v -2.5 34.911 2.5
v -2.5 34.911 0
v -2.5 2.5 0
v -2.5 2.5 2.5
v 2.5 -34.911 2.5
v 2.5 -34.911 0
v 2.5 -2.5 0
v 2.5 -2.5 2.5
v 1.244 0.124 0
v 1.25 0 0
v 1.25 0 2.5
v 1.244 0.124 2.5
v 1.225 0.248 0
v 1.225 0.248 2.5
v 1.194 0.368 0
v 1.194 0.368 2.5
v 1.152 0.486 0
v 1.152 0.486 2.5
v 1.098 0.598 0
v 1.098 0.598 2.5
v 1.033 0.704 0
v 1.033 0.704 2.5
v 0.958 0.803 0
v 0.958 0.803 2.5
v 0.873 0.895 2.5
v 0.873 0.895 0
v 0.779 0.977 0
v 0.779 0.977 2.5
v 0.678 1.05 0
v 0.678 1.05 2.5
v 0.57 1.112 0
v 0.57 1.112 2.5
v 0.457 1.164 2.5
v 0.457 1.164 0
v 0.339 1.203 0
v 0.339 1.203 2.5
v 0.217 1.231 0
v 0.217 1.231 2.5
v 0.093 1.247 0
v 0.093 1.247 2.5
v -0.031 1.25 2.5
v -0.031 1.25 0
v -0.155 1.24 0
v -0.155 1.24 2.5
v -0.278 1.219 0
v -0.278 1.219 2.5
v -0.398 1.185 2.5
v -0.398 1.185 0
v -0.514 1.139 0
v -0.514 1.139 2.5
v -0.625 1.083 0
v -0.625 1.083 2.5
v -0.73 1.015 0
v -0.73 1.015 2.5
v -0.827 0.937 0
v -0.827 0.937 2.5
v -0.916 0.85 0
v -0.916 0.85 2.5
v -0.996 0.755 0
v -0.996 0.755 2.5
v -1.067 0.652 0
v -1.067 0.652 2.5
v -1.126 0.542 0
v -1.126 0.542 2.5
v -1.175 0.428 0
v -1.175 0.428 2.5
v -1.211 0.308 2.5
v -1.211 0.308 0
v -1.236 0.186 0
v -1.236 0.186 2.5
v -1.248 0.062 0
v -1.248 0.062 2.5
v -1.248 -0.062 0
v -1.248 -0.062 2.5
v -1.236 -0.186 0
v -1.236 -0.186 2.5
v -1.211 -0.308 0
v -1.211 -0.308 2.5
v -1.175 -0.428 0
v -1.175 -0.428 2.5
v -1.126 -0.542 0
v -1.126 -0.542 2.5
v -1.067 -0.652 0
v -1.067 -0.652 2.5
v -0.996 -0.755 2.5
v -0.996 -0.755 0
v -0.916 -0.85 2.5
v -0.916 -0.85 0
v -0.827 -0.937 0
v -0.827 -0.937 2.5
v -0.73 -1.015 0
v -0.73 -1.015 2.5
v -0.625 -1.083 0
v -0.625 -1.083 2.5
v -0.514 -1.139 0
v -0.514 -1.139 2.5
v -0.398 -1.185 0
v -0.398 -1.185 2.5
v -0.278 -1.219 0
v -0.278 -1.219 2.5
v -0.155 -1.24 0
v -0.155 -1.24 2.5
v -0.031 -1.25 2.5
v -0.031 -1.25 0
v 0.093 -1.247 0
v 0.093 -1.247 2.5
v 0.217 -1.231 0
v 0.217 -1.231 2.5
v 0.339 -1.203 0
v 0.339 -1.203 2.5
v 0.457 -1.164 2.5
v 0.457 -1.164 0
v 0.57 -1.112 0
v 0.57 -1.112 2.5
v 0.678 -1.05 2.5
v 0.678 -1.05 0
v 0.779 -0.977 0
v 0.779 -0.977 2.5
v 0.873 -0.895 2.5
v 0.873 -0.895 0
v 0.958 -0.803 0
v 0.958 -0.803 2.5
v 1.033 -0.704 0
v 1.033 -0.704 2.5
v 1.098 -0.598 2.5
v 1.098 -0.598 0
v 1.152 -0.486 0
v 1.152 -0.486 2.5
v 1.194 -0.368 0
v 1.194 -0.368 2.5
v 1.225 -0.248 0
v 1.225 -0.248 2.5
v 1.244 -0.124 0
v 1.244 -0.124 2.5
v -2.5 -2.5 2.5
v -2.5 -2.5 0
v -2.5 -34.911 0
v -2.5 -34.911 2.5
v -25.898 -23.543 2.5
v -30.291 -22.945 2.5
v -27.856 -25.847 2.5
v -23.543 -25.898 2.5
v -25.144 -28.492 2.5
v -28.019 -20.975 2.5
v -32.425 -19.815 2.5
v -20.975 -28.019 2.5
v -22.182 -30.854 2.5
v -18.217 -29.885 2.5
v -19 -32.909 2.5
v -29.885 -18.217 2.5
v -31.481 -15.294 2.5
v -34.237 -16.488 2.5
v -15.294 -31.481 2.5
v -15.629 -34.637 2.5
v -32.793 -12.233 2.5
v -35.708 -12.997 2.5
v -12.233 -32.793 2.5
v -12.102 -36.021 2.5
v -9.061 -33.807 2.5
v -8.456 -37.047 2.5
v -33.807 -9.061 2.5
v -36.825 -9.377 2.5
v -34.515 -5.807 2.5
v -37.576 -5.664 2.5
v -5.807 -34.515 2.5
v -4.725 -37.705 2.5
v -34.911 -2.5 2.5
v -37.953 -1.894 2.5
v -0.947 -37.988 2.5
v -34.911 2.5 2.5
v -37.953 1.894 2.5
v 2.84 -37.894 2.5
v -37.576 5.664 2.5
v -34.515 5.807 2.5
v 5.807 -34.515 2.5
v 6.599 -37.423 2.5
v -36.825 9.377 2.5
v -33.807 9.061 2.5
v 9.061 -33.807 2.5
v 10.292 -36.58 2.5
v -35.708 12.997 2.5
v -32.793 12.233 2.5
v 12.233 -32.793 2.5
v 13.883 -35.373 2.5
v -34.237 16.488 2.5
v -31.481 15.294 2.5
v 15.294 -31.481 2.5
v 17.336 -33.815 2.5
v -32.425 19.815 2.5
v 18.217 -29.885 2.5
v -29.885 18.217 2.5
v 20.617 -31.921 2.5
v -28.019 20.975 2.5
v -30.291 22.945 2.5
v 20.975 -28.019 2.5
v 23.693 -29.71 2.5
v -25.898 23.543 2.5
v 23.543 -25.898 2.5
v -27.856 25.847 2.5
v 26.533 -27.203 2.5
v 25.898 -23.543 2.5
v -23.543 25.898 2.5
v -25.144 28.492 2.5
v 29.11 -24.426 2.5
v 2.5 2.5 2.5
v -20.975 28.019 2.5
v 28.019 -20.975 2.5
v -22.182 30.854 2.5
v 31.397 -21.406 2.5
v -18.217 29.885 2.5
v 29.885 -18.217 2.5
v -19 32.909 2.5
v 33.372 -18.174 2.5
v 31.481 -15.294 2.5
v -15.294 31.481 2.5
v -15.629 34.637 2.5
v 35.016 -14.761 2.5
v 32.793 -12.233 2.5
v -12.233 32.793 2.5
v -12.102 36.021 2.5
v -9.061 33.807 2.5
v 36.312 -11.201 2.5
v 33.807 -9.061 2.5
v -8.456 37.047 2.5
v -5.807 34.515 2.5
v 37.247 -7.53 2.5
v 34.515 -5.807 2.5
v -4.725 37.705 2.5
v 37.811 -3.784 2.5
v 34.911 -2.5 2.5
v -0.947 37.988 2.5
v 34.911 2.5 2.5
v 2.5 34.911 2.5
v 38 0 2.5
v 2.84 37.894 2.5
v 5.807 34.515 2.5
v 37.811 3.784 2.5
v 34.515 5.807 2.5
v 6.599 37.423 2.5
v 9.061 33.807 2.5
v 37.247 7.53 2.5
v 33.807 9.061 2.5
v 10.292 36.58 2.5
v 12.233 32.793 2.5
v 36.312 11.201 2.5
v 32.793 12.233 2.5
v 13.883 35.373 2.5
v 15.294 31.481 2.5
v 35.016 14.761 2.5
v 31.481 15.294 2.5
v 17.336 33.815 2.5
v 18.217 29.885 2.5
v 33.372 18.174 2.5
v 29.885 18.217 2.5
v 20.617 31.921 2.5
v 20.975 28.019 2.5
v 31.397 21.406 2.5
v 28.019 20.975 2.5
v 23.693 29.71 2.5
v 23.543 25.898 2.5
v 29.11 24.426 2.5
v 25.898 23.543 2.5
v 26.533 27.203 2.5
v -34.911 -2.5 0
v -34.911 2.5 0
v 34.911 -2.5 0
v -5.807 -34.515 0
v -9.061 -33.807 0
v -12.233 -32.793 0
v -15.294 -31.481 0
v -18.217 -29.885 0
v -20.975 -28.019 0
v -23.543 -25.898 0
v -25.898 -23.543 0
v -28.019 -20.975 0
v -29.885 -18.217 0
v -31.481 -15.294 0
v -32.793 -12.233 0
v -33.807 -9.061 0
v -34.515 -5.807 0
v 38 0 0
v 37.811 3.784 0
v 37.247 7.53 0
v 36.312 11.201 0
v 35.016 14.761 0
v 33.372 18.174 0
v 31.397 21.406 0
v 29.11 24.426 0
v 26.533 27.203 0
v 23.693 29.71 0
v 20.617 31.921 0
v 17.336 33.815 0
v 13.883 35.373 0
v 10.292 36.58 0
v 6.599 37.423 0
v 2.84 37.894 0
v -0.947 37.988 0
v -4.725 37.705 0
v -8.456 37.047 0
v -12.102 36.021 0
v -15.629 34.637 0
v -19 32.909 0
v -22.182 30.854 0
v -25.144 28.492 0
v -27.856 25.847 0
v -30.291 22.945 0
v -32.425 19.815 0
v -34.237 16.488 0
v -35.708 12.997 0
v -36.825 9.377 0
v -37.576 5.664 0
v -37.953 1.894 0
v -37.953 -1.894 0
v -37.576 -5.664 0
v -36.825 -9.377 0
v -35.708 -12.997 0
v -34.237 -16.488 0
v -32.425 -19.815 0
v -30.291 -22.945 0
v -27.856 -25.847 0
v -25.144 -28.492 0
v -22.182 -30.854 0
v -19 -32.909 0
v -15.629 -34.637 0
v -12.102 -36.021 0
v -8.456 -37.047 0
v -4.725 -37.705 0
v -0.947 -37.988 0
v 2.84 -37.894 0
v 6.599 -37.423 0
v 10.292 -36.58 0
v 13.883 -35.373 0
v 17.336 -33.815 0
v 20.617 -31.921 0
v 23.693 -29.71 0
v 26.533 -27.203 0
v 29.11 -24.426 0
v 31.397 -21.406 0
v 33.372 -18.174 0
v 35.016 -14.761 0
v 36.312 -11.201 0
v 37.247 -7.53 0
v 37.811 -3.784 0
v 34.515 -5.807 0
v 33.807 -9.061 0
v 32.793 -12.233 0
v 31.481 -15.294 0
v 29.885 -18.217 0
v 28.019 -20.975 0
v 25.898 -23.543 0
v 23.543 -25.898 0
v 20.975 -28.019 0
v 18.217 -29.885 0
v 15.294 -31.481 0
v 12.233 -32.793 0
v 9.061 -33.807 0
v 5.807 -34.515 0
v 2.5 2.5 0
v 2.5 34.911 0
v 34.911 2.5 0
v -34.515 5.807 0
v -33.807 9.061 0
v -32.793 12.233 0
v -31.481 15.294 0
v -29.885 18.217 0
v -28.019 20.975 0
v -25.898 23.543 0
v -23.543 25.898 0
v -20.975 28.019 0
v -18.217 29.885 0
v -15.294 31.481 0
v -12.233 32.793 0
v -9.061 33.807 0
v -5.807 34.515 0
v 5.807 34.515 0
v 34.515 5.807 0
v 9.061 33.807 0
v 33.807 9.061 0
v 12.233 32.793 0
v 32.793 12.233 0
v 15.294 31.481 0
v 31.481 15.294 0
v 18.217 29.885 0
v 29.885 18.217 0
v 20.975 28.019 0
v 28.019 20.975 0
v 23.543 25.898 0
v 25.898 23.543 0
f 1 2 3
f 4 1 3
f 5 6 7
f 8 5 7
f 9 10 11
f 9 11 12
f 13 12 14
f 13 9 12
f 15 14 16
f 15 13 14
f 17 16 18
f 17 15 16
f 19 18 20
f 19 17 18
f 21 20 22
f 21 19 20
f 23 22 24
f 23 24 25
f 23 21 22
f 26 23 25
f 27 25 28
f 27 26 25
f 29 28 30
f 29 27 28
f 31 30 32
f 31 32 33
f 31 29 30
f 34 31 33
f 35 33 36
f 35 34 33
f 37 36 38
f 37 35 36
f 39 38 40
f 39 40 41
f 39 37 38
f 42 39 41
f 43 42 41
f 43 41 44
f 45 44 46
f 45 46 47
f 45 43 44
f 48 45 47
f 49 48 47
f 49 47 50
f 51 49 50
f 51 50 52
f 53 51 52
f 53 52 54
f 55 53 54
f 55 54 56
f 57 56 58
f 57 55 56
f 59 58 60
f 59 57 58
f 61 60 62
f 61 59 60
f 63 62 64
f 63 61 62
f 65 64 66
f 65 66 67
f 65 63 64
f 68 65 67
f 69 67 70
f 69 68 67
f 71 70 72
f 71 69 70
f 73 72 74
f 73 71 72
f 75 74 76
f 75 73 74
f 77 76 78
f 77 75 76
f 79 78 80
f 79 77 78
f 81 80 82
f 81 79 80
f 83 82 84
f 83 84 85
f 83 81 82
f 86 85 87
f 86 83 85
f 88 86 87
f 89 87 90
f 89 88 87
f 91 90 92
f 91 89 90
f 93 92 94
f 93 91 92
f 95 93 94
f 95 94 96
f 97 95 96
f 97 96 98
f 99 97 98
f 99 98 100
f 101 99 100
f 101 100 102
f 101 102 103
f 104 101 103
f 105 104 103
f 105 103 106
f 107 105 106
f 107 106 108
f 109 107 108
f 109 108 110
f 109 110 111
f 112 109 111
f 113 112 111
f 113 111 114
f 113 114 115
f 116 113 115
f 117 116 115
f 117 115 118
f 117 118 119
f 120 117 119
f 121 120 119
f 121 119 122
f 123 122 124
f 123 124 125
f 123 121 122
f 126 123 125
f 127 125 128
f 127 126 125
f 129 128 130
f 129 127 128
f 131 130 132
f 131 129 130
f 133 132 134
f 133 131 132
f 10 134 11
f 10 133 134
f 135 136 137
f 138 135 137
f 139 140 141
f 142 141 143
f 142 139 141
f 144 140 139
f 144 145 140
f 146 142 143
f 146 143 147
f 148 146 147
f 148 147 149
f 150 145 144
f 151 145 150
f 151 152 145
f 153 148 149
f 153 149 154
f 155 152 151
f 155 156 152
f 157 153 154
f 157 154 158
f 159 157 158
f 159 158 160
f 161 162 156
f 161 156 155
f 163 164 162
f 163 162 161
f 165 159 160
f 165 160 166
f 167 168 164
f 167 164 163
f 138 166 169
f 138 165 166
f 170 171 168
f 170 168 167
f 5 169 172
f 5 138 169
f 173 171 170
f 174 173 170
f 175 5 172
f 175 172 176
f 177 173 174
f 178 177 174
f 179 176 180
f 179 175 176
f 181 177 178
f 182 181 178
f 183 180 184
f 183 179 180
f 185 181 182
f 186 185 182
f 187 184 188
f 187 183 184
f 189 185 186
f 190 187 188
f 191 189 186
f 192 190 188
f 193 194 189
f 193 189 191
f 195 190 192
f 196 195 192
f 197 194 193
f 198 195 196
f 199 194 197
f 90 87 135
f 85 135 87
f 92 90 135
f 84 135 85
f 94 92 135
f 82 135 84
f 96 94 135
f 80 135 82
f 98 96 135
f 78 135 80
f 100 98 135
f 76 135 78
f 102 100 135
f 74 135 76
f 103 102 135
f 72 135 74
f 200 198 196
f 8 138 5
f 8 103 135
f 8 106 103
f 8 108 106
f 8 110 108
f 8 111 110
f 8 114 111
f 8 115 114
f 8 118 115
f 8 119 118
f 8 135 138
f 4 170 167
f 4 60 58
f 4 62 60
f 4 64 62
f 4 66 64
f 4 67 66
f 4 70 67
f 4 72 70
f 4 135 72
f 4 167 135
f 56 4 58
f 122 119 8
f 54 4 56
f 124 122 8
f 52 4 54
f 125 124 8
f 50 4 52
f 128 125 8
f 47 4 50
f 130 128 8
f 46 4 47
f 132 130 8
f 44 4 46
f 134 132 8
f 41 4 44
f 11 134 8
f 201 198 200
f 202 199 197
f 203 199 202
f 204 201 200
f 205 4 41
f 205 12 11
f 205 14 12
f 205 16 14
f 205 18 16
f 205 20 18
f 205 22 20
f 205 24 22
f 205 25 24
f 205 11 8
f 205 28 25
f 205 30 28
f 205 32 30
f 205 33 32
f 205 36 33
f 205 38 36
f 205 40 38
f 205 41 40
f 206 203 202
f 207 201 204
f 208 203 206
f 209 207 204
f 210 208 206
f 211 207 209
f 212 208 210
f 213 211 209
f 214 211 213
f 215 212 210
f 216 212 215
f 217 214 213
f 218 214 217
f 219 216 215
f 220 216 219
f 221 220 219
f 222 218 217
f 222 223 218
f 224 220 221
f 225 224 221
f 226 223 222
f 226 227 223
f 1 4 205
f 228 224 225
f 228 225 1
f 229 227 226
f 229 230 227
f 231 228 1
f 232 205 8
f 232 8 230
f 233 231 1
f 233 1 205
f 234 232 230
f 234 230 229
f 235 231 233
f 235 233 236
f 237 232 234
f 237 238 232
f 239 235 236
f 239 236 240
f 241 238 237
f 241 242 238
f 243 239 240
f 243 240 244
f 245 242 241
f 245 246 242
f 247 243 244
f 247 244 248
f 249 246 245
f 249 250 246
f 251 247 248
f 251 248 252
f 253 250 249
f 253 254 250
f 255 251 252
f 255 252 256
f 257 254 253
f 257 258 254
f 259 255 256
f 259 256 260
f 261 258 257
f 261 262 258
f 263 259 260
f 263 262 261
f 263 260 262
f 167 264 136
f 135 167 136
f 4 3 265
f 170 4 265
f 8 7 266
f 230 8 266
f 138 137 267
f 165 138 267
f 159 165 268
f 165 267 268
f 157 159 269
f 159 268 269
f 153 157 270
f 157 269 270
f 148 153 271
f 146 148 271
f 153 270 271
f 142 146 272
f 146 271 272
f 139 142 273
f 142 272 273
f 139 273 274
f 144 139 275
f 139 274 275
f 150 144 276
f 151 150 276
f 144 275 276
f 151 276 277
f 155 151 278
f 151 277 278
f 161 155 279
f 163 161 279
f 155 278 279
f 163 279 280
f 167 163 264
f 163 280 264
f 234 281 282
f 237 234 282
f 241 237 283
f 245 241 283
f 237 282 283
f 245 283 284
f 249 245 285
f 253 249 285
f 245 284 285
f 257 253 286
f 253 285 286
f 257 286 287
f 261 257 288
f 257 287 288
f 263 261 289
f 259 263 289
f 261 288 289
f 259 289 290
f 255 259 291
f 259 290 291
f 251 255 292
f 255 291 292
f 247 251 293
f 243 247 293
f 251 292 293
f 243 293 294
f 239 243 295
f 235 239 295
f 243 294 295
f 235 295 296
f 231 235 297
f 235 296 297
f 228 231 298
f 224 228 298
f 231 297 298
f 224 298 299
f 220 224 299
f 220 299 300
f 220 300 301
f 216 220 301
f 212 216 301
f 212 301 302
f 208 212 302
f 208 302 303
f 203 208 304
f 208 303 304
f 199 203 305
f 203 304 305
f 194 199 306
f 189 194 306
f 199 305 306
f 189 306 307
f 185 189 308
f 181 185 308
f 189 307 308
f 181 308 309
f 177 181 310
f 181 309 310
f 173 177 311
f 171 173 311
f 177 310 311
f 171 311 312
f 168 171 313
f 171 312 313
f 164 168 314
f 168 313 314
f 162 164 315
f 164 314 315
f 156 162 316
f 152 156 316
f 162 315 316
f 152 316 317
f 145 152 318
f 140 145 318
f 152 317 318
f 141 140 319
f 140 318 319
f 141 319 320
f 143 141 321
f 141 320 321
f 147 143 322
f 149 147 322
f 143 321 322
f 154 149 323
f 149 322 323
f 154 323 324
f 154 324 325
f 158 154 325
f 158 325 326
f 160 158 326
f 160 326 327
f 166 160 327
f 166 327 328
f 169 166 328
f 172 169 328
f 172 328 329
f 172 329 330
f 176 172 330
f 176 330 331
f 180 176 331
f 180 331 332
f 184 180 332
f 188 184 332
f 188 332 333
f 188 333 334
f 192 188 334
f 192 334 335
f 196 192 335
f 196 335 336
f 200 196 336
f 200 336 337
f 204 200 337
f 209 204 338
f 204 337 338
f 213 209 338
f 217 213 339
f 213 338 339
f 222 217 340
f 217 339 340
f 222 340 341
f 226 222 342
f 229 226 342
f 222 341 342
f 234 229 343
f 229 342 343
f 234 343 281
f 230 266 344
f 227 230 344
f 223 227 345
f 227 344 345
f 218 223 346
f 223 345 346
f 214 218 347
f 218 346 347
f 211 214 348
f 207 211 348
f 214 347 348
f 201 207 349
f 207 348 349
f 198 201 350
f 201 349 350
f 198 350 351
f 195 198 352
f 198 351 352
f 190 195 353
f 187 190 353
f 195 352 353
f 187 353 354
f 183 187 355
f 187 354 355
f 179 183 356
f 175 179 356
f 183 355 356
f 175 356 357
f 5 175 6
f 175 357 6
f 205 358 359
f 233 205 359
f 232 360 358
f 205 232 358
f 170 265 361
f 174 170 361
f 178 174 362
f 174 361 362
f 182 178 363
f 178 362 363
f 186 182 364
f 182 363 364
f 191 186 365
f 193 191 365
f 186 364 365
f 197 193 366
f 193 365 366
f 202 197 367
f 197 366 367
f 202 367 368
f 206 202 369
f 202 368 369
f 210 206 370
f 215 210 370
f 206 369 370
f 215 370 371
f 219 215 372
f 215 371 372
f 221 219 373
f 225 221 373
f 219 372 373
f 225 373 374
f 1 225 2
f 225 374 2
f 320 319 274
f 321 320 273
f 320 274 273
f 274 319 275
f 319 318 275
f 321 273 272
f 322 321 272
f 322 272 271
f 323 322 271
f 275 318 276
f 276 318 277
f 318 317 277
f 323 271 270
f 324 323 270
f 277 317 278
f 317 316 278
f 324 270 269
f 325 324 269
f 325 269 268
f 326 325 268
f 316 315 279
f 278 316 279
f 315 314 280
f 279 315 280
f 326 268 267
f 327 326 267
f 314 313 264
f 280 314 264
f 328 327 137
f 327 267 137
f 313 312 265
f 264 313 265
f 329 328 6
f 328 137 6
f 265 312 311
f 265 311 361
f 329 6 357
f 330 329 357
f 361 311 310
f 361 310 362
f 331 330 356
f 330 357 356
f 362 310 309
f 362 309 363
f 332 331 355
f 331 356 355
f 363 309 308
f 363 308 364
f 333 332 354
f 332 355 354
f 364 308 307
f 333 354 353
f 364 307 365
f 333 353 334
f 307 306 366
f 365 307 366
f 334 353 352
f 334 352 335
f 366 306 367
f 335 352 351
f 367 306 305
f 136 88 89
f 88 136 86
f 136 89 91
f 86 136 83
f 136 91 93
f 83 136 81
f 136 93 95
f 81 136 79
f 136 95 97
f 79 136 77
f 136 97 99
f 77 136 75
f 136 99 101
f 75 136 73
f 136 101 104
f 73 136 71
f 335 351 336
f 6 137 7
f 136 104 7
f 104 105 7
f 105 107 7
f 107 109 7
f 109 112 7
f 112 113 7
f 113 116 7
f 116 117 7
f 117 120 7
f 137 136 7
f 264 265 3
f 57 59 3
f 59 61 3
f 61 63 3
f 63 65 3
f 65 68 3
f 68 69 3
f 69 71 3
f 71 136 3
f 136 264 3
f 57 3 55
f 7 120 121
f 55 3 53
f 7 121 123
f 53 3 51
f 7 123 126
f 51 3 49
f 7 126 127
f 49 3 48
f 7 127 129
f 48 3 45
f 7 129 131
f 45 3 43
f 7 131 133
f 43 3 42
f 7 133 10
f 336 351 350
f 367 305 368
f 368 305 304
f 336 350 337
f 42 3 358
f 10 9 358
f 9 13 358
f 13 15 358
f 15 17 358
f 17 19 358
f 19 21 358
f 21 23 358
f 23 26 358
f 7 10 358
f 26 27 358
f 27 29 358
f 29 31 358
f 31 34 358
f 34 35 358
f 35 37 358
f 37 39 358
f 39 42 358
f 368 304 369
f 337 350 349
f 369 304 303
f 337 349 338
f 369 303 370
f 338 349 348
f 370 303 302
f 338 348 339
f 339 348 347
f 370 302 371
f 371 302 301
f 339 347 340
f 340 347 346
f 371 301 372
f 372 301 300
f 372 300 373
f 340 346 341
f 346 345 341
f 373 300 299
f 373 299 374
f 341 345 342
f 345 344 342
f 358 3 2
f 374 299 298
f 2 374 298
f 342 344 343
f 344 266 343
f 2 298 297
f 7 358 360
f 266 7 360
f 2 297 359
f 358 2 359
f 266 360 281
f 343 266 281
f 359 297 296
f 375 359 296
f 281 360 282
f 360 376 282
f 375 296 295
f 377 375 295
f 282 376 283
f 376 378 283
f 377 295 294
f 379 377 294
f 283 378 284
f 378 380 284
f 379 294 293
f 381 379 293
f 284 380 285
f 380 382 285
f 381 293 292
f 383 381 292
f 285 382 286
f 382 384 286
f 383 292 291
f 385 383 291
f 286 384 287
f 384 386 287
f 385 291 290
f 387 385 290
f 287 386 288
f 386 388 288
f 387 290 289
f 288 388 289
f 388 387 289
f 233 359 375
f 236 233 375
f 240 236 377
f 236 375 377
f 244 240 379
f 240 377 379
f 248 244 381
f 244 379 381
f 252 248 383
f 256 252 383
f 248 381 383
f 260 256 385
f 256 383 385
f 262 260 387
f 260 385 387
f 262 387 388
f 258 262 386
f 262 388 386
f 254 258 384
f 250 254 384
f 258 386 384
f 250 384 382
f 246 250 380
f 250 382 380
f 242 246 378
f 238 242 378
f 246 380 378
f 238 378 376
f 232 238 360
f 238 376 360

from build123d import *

# Parameters (mm, degrees)
F0_R     = 38
F0_R_2   = 1.25
F1_DEPTH = 2.5


with BuildPart() as f1:
    # F0 (on Top) → F1 (new body)
    with BuildSketch(Plane.XY):
        Circle(F0_R)
        with BuildLine():
            Line((-34.9106, -2.5), (-2.5, -2.5))
            Line((-2.5, -2.5), (-2.5, -34.9106))
            ThreePointArc((-2.5, -34.9106), (-24.748737, -24.748737), (-34.9106, -2.5))
        make_face(mode=Mode.SUBTRACT)
        with BuildLine():
            Line((2.5, -34.9106), (2.5, -2.5))
            Line((2.5, -2.5), (34.9106, -2.5))
            ThreePointArc((34.9106, -2.5), (24.748737, -24.748737), (2.5, -34.9106))
        make_face(mode=Mode.SUBTRACT)
        with BuildLine():
            ThreePointArc((-34.9106, 2.5), (-24.748737, 24.748737), (-2.5, 34.9106))
            Line((-2.5, 34.9106), (-2.5, 2.5))
            Line((-2.5, 2.5), (-34.9106, 2.5))
        make_face(mode=Mode.SUBTRACT)
        Circle(F0_R_2, mode=Mode.SUBTRACT)
        with BuildLine():
            Line((2.5, 2.5), (2.5, 34.9106))
            ThreePointArc((2.5, 34.9106), (24.748737, 24.748737), (34.9106, 2.5))
            Line((34.9106, 2.5), (2.5, 2.5))
        make_face(mode=Mode.SUBTRACT)
    extrude(amount=F1_DEPTH)


solid = f1.part
